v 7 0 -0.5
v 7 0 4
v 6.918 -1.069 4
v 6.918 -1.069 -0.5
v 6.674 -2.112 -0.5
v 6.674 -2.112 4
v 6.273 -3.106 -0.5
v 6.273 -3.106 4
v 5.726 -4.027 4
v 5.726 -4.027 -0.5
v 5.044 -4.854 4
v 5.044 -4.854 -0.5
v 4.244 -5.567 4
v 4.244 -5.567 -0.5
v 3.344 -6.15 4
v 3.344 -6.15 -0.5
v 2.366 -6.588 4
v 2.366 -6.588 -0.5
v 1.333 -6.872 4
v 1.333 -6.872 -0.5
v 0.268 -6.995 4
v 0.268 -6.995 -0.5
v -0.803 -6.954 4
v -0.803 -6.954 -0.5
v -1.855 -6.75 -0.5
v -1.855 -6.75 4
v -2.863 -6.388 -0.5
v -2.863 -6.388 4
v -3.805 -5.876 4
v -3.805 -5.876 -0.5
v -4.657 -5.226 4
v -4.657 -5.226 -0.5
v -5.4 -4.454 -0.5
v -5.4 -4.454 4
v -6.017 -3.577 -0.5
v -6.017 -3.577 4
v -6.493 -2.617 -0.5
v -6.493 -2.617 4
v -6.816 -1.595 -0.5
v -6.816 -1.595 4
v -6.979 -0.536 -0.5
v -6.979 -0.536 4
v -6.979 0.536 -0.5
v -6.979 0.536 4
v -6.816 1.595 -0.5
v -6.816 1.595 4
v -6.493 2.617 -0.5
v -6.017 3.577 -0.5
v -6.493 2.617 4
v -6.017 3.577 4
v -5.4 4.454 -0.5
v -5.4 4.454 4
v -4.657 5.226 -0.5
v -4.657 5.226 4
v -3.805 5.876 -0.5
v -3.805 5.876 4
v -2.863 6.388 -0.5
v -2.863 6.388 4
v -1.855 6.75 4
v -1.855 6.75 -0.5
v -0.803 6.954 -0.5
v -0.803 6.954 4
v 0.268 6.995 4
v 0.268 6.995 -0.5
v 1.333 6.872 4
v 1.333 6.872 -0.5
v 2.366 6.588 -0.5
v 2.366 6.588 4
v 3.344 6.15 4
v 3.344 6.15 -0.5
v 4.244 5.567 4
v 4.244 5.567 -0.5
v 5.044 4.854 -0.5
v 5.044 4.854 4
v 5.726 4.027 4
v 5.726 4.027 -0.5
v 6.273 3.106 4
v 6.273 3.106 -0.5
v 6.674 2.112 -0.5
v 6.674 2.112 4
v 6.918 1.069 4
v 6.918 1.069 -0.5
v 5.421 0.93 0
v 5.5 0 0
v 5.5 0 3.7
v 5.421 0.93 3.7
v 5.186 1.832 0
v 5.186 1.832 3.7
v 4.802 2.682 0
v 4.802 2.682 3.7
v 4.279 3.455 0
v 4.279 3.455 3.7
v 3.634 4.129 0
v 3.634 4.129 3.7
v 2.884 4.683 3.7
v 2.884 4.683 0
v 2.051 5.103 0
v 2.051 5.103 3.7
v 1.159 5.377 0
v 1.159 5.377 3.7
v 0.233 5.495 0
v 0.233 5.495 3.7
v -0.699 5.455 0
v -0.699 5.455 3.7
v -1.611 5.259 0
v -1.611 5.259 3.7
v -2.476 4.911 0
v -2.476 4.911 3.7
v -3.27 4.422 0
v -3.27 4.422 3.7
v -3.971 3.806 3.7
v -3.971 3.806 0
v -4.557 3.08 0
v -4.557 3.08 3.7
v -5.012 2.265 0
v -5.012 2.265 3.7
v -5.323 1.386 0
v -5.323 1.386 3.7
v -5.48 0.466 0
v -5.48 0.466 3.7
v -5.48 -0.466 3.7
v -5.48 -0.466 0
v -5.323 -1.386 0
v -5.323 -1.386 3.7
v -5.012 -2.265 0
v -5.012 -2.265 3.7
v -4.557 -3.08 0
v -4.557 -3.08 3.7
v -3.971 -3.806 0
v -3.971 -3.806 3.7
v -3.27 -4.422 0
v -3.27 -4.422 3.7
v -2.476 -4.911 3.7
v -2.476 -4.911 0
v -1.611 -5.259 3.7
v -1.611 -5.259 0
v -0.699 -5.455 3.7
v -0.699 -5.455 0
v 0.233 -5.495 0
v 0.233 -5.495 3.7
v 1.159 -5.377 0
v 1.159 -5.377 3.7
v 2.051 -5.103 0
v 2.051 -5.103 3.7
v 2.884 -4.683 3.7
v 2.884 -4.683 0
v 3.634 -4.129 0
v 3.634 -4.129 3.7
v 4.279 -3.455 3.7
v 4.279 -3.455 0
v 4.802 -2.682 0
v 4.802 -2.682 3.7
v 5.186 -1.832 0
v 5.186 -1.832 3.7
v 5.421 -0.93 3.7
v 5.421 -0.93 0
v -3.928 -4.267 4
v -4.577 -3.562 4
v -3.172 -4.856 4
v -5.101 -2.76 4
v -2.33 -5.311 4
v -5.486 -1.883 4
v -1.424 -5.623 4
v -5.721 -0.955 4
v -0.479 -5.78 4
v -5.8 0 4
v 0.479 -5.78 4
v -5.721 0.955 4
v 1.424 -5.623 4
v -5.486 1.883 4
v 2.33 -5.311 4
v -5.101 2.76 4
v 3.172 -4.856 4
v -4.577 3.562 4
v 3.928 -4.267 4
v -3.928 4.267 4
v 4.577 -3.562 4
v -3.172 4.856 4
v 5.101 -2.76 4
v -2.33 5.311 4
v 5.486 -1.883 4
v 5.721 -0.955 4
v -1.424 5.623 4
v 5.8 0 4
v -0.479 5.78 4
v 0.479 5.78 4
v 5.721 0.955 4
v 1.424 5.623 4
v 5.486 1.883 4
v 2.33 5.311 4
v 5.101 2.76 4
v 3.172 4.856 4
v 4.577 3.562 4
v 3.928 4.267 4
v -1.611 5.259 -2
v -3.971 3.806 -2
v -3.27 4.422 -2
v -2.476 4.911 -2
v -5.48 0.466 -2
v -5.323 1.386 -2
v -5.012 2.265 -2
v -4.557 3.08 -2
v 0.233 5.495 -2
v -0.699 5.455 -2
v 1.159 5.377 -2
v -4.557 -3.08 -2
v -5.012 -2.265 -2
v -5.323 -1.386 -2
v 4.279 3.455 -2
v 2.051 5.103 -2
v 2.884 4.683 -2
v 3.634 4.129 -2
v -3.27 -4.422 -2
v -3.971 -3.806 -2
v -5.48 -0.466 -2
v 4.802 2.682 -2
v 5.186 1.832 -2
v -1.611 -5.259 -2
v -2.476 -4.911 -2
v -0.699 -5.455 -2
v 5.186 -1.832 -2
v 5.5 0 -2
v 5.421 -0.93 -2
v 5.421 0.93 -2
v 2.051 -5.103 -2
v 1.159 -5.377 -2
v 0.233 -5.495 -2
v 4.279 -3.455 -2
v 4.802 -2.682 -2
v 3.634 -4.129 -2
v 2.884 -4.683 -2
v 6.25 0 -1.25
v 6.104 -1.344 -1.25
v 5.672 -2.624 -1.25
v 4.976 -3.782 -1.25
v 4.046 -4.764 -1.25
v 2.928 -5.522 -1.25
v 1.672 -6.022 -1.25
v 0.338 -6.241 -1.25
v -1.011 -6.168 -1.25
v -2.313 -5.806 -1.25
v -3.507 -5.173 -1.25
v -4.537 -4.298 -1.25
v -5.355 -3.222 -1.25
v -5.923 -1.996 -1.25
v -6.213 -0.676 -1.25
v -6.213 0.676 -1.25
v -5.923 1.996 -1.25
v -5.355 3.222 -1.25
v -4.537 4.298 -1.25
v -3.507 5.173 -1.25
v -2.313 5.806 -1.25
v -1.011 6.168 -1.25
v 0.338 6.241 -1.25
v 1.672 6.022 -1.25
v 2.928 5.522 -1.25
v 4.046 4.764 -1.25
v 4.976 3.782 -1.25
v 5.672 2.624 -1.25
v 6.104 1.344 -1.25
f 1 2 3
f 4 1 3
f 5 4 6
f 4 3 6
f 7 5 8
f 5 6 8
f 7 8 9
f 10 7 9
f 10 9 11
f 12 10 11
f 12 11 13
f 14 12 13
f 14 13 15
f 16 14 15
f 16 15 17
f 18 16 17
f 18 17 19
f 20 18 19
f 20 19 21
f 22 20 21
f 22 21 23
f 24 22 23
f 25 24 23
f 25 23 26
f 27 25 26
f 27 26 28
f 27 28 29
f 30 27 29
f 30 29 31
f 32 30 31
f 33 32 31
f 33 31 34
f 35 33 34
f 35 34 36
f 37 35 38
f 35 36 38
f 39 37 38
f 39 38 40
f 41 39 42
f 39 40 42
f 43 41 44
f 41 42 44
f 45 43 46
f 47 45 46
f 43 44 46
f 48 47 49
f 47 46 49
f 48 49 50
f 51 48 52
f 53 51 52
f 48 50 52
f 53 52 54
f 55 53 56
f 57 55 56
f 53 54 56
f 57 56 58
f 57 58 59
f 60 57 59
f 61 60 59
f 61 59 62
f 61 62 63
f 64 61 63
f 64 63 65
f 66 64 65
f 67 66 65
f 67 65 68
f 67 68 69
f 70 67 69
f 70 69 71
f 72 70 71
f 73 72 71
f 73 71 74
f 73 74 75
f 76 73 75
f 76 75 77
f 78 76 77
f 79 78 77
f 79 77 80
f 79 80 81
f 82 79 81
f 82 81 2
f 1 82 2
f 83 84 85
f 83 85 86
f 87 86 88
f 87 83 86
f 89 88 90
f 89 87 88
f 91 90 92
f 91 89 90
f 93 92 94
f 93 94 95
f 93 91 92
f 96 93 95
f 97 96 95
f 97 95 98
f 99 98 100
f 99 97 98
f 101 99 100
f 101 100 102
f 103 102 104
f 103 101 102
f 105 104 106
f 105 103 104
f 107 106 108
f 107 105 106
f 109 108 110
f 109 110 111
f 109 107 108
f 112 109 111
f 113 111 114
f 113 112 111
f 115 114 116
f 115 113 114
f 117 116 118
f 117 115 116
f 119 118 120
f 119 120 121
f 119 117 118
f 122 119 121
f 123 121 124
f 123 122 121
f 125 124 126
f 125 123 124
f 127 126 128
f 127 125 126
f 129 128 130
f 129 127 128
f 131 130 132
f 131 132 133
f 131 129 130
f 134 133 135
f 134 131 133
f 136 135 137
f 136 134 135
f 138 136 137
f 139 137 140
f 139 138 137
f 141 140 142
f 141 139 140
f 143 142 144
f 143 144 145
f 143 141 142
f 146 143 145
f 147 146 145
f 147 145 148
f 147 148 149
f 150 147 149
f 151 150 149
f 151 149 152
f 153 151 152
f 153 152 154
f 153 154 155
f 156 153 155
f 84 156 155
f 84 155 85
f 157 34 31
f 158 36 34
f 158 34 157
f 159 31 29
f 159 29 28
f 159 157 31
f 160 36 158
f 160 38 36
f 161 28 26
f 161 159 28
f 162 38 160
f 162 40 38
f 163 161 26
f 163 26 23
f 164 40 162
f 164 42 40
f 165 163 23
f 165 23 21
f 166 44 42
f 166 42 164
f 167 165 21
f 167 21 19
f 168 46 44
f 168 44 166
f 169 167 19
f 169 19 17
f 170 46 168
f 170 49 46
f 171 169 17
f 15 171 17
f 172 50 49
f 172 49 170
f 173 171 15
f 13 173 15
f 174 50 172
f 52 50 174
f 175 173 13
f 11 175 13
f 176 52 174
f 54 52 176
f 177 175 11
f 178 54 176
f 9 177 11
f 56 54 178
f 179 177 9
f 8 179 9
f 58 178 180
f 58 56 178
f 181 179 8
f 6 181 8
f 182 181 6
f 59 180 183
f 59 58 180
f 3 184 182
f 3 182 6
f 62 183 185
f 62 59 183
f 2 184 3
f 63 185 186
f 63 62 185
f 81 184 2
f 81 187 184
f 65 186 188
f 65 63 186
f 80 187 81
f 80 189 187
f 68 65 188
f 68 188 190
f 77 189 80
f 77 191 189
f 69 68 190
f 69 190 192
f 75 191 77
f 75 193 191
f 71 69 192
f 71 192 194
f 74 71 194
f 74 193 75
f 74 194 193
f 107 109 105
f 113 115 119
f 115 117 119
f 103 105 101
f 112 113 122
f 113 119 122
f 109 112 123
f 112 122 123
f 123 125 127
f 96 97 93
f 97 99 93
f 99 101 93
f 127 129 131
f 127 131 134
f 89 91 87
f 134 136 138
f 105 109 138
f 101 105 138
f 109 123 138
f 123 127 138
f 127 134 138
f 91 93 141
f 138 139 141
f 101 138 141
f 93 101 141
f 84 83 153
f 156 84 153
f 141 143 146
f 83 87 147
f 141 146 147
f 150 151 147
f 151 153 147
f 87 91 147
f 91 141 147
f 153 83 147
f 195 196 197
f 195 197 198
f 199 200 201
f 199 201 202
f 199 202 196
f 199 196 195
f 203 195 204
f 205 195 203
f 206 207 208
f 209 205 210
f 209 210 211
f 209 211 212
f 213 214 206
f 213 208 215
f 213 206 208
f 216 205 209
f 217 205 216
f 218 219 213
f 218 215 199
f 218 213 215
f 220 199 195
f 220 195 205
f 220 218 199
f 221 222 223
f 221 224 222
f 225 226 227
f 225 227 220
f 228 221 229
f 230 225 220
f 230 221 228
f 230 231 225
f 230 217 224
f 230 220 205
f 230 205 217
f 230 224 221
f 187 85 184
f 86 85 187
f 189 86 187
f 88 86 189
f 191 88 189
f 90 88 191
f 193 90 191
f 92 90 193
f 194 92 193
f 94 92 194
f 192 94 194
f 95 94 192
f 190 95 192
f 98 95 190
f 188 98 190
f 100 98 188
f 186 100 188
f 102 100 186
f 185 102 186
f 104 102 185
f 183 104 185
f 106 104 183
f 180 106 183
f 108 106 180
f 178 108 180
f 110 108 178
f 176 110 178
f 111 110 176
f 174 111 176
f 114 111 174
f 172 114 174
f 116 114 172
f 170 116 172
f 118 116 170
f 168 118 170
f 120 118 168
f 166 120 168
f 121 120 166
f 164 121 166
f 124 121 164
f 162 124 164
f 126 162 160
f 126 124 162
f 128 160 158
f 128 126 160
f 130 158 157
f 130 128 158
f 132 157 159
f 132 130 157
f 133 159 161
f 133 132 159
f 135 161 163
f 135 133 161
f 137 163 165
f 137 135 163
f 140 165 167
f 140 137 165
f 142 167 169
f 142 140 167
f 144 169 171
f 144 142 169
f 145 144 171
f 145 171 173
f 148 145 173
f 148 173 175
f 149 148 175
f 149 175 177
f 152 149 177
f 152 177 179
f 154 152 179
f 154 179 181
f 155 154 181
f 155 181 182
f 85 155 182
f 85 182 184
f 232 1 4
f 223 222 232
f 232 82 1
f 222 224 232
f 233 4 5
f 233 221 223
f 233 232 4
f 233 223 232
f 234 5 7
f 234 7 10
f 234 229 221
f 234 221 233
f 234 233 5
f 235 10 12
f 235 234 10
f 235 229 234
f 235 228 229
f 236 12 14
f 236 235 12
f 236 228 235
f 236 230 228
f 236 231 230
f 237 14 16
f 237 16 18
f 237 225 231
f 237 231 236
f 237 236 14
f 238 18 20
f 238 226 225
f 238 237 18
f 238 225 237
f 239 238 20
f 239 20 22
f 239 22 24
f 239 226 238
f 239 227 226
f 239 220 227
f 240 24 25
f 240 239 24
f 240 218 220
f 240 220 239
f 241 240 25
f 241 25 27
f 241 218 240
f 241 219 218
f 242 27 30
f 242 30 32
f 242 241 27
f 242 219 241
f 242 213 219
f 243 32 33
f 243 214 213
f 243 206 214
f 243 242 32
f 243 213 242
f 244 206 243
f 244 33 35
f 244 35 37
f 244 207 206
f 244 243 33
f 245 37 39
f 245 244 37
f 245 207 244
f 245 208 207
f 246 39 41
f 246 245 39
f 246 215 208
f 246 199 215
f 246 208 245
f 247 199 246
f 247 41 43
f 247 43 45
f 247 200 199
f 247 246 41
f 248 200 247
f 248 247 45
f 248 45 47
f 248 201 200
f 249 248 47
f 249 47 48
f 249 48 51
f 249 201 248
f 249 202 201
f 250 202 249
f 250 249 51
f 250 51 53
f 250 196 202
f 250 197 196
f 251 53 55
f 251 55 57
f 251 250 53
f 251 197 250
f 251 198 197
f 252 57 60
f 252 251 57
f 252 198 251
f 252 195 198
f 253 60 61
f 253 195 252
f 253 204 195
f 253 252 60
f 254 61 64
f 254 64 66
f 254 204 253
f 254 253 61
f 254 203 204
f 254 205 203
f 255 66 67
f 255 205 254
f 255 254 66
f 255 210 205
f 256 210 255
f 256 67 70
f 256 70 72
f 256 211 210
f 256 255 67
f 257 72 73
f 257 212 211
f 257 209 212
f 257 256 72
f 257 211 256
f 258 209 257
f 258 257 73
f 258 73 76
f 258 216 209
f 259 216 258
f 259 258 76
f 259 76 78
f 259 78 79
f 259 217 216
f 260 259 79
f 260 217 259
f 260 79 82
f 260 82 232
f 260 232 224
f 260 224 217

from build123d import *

# Parameters (mm, degrees)
F0_R     = 7
F0_R_2   = 5.5
F1_DEPTH = 4
F2_R     = 7
F3_DEPTH = 2
F4_SIZE  = 1.5
F5_SIZE  = 0.3


with BuildPart() as f1:
    # F0 (on Top) → F1 (new body)
    with BuildSketch(Plane.XY):
        Circle(F0_R)
        Circle(F0_R_2, mode=Mode.SUBTRACT)
    extrude(amount=F1_DEPTH)

    # F2 (on face) → F3 (join)
    with BuildSketch(Plane(origin=(0, 0, 0), x_dir=(1, 0, 0), z_dir=(0, 0, -1))):
        Circle(F2_R)
    extrude(amount=F3_DEPTH)

    # F4
    f4_edges = [f1.edges().sort_by_distance(p)[0] for p in [
        (-7, 0, -2),
    ]]
    chamfer(f4_edges, length=F4_SIZE)

    # F5
    f5_edges = [f1.edges().sort_by_distance(p)[0] for p in [
        (-5.5, 0, 4),
    ]]
    chamfer(f5_edges, length=F5_SIZE)


solid = f1.part
